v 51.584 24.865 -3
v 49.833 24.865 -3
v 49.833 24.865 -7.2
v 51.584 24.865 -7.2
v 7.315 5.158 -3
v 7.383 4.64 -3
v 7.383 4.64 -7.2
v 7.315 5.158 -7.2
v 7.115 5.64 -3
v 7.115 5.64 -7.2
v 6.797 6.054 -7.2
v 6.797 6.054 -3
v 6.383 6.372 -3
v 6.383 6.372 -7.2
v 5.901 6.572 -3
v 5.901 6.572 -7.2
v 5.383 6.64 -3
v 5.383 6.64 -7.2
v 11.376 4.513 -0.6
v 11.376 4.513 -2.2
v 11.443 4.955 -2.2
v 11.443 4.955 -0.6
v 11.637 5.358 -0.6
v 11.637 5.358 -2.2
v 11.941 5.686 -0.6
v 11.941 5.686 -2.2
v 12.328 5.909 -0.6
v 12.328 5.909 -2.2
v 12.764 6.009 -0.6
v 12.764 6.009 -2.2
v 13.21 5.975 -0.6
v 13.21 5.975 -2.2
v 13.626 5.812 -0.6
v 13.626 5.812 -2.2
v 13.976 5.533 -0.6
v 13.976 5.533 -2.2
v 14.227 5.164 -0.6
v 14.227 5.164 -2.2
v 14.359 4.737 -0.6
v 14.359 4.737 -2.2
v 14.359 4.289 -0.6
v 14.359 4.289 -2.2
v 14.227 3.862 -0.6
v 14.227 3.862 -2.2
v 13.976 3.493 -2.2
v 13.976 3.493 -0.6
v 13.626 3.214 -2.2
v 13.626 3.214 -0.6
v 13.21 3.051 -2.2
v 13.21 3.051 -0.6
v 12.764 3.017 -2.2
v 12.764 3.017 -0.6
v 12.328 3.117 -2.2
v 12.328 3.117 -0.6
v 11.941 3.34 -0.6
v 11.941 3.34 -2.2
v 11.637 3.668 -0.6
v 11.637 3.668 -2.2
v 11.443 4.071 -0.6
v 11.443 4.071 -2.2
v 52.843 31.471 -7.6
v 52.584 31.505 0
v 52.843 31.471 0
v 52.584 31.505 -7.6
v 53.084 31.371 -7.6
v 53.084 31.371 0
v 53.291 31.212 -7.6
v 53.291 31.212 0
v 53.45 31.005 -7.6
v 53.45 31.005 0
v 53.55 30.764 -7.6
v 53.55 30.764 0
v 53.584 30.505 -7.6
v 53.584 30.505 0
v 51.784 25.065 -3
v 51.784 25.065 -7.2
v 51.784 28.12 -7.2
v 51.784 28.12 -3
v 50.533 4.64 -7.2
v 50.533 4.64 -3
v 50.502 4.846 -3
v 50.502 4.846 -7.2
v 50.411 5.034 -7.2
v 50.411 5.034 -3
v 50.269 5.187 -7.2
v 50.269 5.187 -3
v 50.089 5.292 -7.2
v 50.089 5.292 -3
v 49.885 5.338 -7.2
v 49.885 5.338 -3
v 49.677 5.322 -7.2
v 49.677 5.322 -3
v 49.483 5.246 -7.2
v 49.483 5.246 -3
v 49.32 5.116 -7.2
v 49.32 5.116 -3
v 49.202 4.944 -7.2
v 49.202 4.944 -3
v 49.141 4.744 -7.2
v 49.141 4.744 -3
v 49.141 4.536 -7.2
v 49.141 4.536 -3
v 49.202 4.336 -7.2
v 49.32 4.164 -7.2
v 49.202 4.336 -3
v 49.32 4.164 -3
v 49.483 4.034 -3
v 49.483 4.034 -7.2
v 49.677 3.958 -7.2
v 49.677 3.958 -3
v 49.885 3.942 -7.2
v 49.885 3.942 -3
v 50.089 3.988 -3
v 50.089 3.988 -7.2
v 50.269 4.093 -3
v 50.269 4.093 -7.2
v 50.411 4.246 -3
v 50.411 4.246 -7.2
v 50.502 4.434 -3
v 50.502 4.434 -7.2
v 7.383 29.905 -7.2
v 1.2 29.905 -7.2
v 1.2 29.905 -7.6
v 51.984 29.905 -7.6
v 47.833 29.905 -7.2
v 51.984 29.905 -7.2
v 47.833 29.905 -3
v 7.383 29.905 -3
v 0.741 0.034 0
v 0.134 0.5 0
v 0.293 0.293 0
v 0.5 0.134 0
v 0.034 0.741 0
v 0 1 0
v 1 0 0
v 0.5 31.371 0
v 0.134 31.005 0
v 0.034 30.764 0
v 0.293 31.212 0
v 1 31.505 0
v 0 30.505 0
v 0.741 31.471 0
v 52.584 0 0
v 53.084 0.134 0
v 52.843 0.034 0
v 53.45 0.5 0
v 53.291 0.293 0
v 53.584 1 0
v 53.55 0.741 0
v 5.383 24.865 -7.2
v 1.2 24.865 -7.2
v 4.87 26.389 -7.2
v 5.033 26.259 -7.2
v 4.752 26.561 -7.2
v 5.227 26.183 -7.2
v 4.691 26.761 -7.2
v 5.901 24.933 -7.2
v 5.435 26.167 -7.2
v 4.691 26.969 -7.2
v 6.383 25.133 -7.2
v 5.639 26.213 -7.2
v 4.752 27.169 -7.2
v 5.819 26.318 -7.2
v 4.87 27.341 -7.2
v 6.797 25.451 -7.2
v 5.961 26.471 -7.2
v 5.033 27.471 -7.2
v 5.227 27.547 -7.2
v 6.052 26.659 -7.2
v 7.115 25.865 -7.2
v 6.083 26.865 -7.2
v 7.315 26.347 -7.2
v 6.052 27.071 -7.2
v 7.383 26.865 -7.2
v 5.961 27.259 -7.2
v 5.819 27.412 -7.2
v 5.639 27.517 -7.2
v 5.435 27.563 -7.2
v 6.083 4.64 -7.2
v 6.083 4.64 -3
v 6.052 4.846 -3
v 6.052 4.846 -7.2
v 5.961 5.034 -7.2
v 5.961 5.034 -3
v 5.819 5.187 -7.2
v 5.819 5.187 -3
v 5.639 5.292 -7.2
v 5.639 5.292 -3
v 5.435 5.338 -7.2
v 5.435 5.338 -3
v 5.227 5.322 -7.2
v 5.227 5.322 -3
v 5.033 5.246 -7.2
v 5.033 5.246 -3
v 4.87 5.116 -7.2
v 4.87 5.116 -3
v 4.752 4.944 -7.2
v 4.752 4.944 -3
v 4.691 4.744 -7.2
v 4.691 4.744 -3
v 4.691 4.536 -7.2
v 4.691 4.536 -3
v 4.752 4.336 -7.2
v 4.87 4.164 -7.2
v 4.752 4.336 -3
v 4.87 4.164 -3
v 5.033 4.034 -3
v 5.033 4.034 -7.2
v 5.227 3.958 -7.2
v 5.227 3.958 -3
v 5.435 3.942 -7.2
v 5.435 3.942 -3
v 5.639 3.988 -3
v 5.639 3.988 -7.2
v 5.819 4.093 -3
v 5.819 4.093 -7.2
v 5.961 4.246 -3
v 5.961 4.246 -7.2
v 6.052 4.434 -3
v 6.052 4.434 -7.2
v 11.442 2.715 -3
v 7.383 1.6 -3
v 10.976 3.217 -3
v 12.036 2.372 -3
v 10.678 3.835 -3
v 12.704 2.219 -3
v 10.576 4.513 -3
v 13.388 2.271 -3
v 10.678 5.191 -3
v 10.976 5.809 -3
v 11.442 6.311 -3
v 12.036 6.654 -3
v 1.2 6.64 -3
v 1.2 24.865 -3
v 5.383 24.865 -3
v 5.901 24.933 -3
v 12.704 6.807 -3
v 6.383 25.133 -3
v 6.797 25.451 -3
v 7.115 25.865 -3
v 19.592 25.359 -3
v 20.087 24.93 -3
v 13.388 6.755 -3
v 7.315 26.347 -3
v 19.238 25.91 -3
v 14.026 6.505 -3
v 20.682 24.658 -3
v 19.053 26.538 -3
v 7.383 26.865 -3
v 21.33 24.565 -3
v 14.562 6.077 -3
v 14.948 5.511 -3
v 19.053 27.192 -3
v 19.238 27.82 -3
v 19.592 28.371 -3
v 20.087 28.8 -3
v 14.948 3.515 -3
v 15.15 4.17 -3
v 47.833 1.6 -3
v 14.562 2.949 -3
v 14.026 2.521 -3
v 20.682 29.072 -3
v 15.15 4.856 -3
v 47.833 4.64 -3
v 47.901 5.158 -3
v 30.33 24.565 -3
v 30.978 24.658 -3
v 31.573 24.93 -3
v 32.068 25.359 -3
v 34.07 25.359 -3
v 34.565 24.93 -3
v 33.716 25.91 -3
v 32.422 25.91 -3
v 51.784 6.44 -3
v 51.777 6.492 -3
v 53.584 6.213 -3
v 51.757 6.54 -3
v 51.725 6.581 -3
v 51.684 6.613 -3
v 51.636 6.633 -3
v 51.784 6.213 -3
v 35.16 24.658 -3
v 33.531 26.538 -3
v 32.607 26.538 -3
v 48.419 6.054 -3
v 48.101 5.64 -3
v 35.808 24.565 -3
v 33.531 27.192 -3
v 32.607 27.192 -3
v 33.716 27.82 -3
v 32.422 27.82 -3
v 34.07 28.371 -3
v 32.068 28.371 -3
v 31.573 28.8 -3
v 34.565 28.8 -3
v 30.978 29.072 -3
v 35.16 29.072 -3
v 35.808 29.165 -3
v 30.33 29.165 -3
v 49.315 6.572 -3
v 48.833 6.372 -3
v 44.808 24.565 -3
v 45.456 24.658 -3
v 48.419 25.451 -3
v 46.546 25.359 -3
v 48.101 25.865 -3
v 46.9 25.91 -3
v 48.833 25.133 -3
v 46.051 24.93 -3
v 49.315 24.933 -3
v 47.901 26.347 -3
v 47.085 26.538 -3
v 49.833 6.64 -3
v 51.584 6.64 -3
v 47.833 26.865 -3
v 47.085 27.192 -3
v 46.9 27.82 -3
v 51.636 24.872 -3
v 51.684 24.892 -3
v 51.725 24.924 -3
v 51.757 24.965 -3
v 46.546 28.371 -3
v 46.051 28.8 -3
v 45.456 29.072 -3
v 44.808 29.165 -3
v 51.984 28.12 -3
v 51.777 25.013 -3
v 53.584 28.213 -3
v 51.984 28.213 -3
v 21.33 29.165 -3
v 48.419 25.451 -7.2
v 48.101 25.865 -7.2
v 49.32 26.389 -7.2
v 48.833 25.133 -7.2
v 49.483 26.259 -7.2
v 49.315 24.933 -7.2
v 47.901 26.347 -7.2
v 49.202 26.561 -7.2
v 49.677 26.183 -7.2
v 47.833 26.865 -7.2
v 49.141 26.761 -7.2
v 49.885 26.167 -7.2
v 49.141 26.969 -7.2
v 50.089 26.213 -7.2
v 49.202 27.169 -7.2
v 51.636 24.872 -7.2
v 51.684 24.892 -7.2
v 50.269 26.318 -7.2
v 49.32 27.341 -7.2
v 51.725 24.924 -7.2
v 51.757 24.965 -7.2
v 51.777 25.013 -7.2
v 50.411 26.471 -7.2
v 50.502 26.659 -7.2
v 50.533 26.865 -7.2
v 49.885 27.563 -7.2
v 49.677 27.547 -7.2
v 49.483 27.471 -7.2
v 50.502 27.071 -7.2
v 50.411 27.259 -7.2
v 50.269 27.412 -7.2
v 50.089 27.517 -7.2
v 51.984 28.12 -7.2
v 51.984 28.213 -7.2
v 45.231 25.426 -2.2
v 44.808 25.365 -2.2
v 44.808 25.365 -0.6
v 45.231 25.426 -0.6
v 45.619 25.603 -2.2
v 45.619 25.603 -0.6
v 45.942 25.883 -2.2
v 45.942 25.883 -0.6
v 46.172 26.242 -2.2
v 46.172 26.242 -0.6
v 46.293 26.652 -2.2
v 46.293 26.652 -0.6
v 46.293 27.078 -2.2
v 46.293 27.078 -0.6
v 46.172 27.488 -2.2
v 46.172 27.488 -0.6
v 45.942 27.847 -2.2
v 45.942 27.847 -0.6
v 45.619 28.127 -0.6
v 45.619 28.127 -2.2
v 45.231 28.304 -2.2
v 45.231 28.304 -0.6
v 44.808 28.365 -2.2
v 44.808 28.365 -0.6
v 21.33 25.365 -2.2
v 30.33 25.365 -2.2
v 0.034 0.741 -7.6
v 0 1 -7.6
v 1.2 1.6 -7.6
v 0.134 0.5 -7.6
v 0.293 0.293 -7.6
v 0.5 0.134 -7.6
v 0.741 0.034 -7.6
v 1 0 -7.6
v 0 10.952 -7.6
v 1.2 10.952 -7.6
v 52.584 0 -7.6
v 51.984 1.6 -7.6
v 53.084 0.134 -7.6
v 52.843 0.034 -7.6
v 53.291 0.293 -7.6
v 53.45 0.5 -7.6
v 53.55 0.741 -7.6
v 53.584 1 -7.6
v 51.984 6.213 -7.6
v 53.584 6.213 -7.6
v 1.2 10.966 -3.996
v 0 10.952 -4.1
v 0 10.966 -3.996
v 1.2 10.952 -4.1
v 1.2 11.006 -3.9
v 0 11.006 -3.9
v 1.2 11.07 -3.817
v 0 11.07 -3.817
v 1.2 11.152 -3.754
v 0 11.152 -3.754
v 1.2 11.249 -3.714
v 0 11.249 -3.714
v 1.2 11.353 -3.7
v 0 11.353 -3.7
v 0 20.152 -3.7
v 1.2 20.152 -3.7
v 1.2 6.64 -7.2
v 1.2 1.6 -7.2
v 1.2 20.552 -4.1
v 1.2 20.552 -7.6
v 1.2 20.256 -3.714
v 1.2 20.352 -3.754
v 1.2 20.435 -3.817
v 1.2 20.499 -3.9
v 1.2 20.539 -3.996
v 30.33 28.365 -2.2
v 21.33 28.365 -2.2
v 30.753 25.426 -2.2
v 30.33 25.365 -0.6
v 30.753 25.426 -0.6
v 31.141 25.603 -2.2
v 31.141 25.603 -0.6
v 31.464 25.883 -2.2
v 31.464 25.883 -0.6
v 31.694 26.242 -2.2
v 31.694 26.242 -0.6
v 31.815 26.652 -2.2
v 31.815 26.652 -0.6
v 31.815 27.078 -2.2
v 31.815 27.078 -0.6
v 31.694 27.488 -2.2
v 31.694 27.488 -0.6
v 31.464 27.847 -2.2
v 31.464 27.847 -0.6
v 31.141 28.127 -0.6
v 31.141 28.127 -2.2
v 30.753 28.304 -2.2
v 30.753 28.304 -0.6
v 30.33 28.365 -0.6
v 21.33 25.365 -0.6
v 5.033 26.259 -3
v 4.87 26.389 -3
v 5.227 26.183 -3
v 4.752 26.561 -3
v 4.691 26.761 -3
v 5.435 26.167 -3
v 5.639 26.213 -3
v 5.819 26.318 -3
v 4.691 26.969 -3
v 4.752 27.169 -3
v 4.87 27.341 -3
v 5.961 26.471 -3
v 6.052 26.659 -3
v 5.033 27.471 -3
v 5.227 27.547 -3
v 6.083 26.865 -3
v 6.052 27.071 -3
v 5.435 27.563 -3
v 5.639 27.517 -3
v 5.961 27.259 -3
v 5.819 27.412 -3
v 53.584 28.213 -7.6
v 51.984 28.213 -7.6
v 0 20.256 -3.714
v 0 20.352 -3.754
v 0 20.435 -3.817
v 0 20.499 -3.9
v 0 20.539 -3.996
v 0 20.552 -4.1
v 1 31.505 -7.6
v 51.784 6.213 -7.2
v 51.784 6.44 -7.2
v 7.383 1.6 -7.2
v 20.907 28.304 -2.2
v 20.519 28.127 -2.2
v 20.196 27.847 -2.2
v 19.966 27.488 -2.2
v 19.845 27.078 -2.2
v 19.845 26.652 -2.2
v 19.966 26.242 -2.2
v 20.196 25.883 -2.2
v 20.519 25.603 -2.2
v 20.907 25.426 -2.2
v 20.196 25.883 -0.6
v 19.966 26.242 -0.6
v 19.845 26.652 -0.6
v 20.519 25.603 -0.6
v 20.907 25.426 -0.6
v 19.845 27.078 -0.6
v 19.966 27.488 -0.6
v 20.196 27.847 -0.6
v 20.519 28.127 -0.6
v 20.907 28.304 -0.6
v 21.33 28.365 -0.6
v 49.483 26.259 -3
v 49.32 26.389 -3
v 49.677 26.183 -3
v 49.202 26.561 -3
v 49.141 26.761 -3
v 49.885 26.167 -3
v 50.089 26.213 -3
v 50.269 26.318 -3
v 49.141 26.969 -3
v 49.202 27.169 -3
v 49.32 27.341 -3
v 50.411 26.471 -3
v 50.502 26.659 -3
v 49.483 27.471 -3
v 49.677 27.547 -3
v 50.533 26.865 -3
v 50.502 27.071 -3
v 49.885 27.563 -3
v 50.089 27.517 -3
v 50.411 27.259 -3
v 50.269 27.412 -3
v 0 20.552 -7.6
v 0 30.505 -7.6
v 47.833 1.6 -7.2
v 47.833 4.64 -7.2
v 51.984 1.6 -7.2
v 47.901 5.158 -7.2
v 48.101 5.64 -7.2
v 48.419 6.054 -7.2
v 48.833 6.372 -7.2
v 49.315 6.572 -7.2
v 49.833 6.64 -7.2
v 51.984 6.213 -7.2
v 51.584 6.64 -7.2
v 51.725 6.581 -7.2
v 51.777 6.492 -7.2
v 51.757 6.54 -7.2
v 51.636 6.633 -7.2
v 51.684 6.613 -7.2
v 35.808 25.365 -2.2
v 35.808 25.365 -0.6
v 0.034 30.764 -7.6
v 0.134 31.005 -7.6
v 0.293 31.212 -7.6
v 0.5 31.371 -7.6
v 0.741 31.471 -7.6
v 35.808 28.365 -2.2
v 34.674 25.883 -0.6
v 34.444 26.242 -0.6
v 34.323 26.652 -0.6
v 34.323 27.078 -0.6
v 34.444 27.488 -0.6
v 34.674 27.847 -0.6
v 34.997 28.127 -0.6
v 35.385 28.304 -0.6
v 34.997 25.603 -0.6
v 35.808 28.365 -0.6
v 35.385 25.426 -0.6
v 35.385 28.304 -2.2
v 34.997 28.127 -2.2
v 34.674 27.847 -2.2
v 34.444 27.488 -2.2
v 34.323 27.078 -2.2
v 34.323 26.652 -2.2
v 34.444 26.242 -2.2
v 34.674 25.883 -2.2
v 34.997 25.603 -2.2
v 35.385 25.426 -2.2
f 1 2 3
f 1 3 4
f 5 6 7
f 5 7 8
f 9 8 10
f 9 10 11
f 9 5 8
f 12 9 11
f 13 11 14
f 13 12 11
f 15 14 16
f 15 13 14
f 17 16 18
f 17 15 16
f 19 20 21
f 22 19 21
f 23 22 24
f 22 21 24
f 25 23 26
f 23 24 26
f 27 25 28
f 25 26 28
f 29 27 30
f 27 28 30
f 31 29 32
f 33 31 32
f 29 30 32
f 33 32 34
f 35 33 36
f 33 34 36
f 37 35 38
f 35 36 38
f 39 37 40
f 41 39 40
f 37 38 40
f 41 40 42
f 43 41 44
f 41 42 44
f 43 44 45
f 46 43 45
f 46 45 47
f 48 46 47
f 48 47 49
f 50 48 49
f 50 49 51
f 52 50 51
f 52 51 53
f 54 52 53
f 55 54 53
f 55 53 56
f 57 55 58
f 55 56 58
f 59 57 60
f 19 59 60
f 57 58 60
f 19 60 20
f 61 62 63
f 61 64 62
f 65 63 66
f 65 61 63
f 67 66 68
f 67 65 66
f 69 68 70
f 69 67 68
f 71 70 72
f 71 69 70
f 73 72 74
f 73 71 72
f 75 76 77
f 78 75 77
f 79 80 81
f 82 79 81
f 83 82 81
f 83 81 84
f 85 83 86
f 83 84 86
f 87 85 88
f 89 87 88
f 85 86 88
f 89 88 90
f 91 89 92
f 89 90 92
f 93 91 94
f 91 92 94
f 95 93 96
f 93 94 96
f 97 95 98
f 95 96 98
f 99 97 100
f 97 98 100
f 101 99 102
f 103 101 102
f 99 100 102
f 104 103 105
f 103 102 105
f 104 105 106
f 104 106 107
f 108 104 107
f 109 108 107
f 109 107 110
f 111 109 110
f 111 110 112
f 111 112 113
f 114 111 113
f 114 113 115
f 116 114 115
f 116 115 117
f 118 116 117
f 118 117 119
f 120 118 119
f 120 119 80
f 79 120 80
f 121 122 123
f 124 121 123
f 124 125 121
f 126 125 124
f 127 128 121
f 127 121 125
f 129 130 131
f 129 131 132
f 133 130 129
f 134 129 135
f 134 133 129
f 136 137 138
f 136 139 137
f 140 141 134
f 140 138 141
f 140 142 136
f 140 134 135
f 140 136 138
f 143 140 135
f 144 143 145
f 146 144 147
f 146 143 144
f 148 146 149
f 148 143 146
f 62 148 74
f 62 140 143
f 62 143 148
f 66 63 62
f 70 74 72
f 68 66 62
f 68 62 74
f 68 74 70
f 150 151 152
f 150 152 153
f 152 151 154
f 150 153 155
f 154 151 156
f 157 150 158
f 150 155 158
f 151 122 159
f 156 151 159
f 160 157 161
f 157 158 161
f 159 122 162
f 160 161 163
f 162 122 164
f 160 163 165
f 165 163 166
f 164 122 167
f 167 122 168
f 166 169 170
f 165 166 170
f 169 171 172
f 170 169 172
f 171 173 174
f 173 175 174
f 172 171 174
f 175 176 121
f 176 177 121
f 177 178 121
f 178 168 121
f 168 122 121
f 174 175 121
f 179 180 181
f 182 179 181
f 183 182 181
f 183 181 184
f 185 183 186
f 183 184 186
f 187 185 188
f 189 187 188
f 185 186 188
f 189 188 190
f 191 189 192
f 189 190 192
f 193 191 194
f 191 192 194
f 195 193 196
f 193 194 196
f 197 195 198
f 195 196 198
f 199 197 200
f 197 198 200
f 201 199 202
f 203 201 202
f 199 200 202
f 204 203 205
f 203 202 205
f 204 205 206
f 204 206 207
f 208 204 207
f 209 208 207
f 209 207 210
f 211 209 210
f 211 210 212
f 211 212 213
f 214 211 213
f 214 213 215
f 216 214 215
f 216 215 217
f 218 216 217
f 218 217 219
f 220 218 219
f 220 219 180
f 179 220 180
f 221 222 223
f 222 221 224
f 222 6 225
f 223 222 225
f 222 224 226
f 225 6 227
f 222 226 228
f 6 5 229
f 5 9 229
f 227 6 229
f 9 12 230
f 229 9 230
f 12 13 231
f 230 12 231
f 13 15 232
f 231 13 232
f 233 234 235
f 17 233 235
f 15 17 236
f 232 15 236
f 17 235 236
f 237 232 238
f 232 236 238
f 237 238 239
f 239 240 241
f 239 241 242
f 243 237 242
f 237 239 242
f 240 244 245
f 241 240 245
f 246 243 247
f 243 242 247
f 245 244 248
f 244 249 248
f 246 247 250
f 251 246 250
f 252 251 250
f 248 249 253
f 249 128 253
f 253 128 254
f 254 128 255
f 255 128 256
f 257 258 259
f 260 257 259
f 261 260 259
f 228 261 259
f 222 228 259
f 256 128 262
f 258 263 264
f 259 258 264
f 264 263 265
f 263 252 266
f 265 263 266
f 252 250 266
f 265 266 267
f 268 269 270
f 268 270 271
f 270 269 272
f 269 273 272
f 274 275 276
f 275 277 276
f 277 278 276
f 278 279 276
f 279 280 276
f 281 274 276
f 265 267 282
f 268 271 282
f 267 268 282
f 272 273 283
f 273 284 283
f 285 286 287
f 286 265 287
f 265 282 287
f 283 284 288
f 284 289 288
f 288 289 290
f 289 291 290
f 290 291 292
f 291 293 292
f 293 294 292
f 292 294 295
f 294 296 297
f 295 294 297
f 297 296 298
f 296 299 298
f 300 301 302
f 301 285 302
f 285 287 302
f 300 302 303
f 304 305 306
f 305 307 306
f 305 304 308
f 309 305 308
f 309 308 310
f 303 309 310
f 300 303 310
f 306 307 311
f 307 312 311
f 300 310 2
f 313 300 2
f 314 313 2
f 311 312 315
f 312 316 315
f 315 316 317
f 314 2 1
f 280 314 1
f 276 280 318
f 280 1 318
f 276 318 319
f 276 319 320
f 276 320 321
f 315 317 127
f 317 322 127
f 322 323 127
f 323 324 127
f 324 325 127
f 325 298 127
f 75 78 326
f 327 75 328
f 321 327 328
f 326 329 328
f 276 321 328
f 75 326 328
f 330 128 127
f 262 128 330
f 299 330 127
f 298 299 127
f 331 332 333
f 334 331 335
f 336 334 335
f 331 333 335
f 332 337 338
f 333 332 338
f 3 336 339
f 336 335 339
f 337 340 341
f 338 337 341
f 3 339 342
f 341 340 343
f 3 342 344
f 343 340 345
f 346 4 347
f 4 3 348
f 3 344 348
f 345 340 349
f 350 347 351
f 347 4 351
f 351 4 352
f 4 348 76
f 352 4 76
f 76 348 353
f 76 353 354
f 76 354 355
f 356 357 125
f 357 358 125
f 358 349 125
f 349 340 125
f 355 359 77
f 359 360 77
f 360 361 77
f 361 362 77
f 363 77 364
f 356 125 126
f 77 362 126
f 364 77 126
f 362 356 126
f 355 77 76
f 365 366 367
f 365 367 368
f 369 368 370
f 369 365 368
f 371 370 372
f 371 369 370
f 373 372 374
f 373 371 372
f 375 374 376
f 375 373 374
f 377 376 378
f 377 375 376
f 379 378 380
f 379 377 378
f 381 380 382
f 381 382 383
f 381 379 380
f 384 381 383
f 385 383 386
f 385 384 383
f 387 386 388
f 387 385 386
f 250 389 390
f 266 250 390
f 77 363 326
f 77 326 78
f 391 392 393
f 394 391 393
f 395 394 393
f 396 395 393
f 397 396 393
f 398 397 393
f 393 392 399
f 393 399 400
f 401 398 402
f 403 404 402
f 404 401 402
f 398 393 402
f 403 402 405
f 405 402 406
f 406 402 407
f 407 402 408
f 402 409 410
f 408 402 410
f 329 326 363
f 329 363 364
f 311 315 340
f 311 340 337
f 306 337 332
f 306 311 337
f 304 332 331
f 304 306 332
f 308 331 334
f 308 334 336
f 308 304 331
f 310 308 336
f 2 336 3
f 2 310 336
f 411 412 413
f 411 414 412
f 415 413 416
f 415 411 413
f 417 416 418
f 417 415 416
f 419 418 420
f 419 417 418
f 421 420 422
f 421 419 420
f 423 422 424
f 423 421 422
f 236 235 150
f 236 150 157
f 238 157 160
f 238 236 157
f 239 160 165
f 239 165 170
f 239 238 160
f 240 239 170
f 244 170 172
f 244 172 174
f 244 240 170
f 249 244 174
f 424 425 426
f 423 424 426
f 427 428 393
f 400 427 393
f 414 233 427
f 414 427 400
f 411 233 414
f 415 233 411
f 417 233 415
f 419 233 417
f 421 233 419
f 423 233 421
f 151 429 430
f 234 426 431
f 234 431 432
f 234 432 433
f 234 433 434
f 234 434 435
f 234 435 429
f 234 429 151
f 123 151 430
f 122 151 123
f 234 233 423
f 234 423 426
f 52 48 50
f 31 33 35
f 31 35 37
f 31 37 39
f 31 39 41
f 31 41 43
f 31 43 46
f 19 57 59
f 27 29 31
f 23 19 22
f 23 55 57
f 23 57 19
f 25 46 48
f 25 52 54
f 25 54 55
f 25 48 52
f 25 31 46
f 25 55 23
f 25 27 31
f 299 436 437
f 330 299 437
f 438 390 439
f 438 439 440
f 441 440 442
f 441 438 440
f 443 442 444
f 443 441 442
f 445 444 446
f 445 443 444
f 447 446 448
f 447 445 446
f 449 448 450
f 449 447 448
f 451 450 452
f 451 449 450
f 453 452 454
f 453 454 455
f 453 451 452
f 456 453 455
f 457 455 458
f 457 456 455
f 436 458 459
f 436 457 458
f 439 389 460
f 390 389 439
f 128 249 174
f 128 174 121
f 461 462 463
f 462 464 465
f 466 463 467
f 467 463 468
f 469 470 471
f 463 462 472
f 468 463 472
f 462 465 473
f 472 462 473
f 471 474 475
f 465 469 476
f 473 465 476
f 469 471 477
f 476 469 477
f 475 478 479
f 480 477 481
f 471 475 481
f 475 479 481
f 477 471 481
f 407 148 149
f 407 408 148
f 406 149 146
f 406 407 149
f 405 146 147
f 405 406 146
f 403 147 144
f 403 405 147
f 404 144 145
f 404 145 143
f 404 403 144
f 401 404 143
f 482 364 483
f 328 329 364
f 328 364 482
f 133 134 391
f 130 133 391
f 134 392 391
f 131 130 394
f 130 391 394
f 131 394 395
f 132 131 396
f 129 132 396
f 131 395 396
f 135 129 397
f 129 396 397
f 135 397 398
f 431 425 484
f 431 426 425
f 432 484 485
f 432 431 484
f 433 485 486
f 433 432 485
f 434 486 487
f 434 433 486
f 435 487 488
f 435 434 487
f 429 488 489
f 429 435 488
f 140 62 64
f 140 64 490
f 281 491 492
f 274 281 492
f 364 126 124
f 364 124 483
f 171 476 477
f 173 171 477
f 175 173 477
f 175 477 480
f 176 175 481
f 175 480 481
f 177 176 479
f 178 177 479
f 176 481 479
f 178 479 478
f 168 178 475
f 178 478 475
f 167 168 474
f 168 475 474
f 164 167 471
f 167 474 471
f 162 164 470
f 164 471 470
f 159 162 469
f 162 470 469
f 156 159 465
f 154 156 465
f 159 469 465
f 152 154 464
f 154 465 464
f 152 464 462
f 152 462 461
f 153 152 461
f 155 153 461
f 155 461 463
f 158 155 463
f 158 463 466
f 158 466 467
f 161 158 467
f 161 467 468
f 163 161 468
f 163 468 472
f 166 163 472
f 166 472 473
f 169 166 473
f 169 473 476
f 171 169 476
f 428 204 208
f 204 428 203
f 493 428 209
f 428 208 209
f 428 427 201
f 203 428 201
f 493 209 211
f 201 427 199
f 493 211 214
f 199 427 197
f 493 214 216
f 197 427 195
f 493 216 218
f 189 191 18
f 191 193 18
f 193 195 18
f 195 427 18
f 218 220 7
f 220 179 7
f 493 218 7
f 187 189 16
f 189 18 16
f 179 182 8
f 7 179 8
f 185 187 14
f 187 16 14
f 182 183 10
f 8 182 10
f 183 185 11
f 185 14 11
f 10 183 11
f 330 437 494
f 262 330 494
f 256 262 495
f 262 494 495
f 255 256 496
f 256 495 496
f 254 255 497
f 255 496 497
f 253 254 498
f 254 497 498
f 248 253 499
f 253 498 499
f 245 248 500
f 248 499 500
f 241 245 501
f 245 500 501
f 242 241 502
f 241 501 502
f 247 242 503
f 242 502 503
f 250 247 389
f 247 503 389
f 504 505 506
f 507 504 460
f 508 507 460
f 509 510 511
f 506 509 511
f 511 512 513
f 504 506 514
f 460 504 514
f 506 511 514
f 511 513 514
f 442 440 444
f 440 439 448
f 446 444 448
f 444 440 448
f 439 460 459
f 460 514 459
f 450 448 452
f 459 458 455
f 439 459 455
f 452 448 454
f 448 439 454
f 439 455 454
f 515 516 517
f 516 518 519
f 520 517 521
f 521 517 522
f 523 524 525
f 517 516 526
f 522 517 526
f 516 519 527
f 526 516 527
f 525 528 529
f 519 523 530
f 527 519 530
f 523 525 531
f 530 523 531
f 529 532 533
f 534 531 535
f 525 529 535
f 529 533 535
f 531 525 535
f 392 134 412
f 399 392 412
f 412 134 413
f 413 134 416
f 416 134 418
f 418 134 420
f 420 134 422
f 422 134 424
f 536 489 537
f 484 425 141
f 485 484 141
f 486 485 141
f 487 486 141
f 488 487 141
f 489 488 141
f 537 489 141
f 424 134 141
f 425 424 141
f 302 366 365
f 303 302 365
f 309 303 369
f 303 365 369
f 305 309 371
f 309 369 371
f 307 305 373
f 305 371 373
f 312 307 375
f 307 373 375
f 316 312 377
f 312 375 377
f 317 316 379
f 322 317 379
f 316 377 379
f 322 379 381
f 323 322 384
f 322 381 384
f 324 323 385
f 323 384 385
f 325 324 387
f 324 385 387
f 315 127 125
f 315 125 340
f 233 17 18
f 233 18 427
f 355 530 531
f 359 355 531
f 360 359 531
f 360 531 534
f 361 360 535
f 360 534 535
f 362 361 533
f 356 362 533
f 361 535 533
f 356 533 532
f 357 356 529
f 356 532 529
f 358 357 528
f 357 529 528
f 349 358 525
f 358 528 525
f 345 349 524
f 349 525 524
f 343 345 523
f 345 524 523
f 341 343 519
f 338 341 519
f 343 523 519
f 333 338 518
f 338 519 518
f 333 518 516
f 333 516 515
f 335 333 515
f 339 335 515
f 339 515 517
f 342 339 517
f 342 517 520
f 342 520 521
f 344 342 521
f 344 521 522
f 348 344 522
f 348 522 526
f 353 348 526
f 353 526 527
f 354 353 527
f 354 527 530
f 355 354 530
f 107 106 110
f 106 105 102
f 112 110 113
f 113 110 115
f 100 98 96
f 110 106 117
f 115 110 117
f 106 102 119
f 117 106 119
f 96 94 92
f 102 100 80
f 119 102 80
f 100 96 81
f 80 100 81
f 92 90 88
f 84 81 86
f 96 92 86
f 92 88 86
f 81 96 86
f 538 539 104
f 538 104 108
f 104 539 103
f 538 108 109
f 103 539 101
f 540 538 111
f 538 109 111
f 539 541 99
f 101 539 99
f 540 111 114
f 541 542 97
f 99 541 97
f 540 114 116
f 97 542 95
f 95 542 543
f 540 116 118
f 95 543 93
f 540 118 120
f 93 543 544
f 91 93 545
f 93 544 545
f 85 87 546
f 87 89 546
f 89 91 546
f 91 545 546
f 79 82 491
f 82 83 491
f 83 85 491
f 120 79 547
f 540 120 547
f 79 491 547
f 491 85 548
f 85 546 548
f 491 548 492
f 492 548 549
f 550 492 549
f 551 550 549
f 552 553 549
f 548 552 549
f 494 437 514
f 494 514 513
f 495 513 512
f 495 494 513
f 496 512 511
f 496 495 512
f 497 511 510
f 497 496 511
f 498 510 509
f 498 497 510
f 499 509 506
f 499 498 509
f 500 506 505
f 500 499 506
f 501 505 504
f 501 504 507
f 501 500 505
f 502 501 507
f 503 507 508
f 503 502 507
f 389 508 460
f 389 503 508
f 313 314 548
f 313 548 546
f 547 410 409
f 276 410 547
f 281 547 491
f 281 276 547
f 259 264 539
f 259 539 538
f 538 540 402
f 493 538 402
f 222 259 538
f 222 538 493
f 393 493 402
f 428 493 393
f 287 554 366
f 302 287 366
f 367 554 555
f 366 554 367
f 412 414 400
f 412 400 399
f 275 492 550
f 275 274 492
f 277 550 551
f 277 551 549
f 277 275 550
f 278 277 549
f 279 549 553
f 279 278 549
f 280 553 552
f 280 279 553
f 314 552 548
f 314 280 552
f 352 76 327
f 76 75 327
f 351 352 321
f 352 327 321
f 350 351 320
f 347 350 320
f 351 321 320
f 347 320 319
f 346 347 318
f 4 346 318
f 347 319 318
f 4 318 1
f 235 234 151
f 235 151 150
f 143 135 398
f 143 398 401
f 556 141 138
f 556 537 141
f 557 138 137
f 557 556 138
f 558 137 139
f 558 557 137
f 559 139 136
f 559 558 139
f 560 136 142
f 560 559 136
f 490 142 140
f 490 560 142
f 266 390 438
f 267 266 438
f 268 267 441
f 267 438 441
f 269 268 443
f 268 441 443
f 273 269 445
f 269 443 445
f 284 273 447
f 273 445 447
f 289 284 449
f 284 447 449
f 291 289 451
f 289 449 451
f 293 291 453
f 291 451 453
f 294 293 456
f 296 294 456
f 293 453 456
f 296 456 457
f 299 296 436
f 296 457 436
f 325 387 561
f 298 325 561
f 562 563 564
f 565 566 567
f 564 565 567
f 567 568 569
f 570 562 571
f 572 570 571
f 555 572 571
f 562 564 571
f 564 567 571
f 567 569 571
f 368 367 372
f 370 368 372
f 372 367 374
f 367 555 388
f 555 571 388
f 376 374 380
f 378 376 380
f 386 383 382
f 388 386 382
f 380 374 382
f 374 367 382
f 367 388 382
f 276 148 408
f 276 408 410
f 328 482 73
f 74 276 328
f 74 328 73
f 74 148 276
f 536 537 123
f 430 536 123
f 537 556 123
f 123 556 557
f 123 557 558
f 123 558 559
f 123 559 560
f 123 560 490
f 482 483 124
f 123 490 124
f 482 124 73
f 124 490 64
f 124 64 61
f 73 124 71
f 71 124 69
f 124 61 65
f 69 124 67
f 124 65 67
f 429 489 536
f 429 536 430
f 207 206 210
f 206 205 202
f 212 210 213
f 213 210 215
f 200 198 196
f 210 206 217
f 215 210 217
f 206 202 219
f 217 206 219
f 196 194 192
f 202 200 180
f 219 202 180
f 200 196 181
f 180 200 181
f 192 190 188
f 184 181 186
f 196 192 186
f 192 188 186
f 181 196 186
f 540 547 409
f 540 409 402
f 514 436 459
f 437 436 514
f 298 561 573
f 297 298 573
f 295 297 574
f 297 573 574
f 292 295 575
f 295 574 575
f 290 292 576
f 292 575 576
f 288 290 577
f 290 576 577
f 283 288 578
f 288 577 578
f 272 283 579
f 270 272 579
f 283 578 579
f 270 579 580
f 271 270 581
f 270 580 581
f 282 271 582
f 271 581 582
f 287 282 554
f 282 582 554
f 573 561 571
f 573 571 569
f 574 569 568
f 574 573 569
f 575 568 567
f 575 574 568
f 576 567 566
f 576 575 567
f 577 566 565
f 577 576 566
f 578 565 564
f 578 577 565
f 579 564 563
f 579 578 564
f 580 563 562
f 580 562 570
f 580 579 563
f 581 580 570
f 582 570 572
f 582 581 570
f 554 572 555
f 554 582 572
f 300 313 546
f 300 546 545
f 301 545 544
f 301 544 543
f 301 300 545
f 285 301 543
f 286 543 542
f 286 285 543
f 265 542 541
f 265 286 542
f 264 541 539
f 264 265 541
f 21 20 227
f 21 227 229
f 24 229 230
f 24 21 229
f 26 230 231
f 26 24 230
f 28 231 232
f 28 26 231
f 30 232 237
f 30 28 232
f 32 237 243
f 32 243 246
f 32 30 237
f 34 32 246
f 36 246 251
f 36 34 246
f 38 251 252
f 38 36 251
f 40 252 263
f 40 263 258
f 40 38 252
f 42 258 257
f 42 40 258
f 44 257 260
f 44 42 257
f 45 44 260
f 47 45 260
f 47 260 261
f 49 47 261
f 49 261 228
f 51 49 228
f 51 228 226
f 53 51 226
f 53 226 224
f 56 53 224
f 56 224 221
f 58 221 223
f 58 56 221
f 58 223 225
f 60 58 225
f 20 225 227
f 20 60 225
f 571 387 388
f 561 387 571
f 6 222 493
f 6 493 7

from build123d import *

# Parameters (mm, degrees)
SKETCH_1_R          = 2
SKETCH_1_R_2        = 0.7
EXTRUDE_5_DEPTH     = 3
EXTRUDE_6_DEPTH     = 7.6
SKETCH_1_8_R        = 2
SKETCH_1_8_R_2      = 0.7
EXTRUDE_7_DEPTH     = 7.2
SKETCH_1_9_W        = 1.2
SKETCH_1_9_H        = 9.6
EXTRUDE_8_DEPTH     = 3.7
FILLET_1_R          = 1
SKETCH_2_R          = 1.5
CUT_EXTRUDE_1_DEPTH = 2.4
CHAMFER_1_SIZE      = 0.8
FILLET_2_R          = 0.4
SKETCH_3_W          = 0.2
SKETCH_3_H          = 3.255284899
SKETCH_3_H_2        = 0.427
CUT_EXTRUDE_2_DEPTH = 4.2
FILLET_3_R          = 0.2


with BuildPart() as part:
    # Эскиз1 → Бобышка-Вытянуть5 (new body)
    with BuildSketch(Plane.XY):
        with BuildLine():
            Line((1.2, 20.5525), (1.2, 10.9525))
            Line((1.2, 10.9525), (1.2, 6.64))
            Line((1.2, 6.64), (5.383, 6.64))
            ThreePointArc((5.383, 6.64), (6.797213562, 6.054213562), (7.383, 4.64))
            Line((7.383, 4.64), (7.383, 1.6))
            Line((7.383, 1.6), (47.833, 1.6))
            Line((47.833, 1.6), (47.833, 4.64))
            ThreePointArc((47.833, 4.64), (48.418786438, 6.054213562), (49.833, 6.64))
            Line((49.833, 6.64), (51.984, 6.64))
            Line((51.984, 6.64), (51.984, 24.865))
            Line((51.984, 24.865), (49.833, 24.865))
            ThreePointArc((49.833, 24.865), (48.418786438, 25.450786438), (47.833, 26.865))
            Line((47.833, 26.865), (47.833, 29.905))
            Line((47.833, 29.905), (7.383, 29.905))
            Line((7.383, 29.905), (7.383, 26.865))
            ThreePointArc((7.383, 26.865), (6.797213562, 25.450786438), (5.383, 24.865))
            Line((5.383, 24.865), (1.2, 24.865))
            Line((1.2, 24.865), (1.2, 20.5525))
        make_face()
        Polygon((51.984, 6.213), (53.584, 6.213), (53.584, 28.213), (51.984, 28.213), (51.984, 24.865), (51.984, 6.64), align=None)
        with BuildLine():
            Line((51.984, 24.865), (51.984, 28.213))
            Line((51.984, 28.213), (51.984, 29.905))
            Line((51.984, 29.905), (47.833, 29.905))
            Line((47.833, 29.905), (47.833, 26.865))
            ThreePointArc((47.833, 26.865), (49.833, 28.865), (51.833, 26.865))
            ThreePointArc((51.833, 26.865), (51.247213562, 25.450786438), (49.833, 24.865))
            Line((49.833, 24.865), (51.984, 24.865))
        make_face()
        with Locations((49.833, 26.865)):
            Circle(SKETCH_1_R)
        with Locations((49.833, 26.865)):
            Circle(SKETCH_1_R_2, mode=Mode.SUBTRACT)
        with Locations((49.833, 26.865)):
            Circle(SKETCH_1_R_2)
        with BuildLine():
            Line((1.2, 29.905), (1.2, 24.865))
            Line((1.2, 24.865), (5.383, 24.865))
            ThreePointArc((5.383, 24.865), (3.968786438, 28.279213562), (7.383, 26.865))
            Line((7.383, 26.865), (7.383, 29.905))
            Line((7.383, 29.905), (1.2, 29.905))
        make_face()
        with Locations((5.383, 26.865)):
            Circle(SKETCH_1_R)
        with Locations((5.383, 26.865)):
            Circle(SKETCH_1_R_2, mode=Mode.SUBTRACT)
        with Locations((5.383, 26.865)):
            Circle(SKETCH_1_R_2)
        with BuildLine():
            Line((5.383, 6.64), (1.2, 6.64))
            Line((1.2, 6.64), (1.2, 1.6))
            Line((1.2, 1.6), (7.383, 1.6))
            Line((7.383, 1.6), (7.383, 4.64))
            ThreePointArc((7.383, 4.64), (3.968786438, 3.225786438), (5.383, 6.64))
        make_face()
        with Locations((5.383, 4.64)):
            Circle(SKETCH_1_R)
        with Locations((5.383, 4.64)):
            Circle(SKETCH_1_R_2, mode=Mode.SUBTRACT)
        with Locations((5.383, 4.64)):
            Circle(SKETCH_1_R_2)
        with BuildLine():
            Line((51.984, 1.6), (51.984, 6.213))
            Line((51.984, 6.213), (51.984, 6.64))
            Line((51.984, 6.64), (49.833, 6.64))
            ThreePointArc((49.833, 6.64), (51.247213562, 6.054213562), (51.833, 4.64))
            ThreePointArc((51.833, 4.64), (49.833, 2.64), (47.833, 4.64))
            Line((47.833, 4.64), (47.833, 1.6))
            Line((47.833, 1.6), (51.984, 1.6))
        make_face()
        with Locations((49.833, 4.64)):
            Circle(SKETCH_1_R)
        with Locations((49.833, 4.64)):
            Circle(SKETCH_1_R_2, mode=Mode.SUBTRACT)
        with Locations((49.833, 4.64)):
            Circle(SKETCH_1_R_2)
    extrude(amount=-EXTRUDE_5_DEPTH)

    # Эскиз1<7> → Бобышка-Вытянуть6 (add)
    with BuildSketch(Plane.XY):
        Polygon((0, 31.505), (0, 20.5525), (1.2, 20.5525), (1.2, 24.865), (1.2, 29.905), (7.383, 29.905), (47.833, 29.905), (51.984, 29.905), (51.984, 28.213), (53.584, 28.213), (53.584, 31.505), align=None)
        Polygon((0, 10.9525), (0, 0), (53.584, 0), (53.584, 6.213), (51.984, 6.213), (51.984, 1.6), (47.833, 1.6), (7.383, 1.6), (1.2, 1.6), (1.2, 6.64), (1.2, 10.9525), align=None)
    extrude(amount=-EXTRUDE_6_DEPTH)

    # Эскиз1<8> → Бобышка-Вытянуть7 (add)
    with BuildSketch(Plane.XY):
        with BuildLine():
            Line((51.984, 24.865), (51.984, 28.213))
            Line((51.984, 28.213), (51.984, 29.905))
            Line((51.984, 29.905), (47.833, 29.905))
            Line((47.833, 29.905), (47.833, 26.865))
            ThreePointArc((47.833, 26.865), (49.833, 28.865), (51.833, 26.865))
            ThreePointArc((51.833, 26.865), (51.247213562, 25.450786438), (49.833, 24.865))
            Line((49.833, 24.865), (51.984, 24.865))
        make_face()
        with Locations((49.833, 26.865)):
            Circle(SKETCH_1_8_R)
        with Locations((49.833, 26.865)):
            Circle(SKETCH_1_8_R_2, mode=Mode.SUBTRACT)
        with BuildLine():
            Line((1.2, 29.905), (1.2, 24.865))
            Line((1.2, 24.865), (5.383, 24.865))
            ThreePointArc((5.383, 24.865), (3.968786438, 28.279213562), (7.383, 26.865))
            Line((7.383, 26.865), (7.383, 29.905))
            Line((7.383, 29.905), (1.2, 29.905))
        make_face()
        with Locations((5.383, 26.865)):
            Circle(SKETCH_1_8_R)
        with Locations((5.383, 26.865)):
            Circle(SKETCH_1_8_R_2, mode=Mode.SUBTRACT)
        with BuildLine():
            Line((51.984, 1.6), (51.984, 6.213))
            Line((51.984, 6.213), (51.984, 6.64))
            Line((51.984, 6.64), (49.833, 6.64))
            ThreePointArc((49.833, 6.64), (51.247213562, 6.054213562), (51.833, 4.64))
            ThreePointArc((51.833, 4.64), (49.833, 2.64), (47.833, 4.64))
            Line((47.833, 4.64), (47.833, 1.6))
            Line((47.833, 1.6), (51.984, 1.6))
        make_face()
        with Locations((49.833, 4.64)):
            Circle(SKETCH_1_8_R)
        with Locations((49.833, 4.64)):
            Circle(SKETCH_1_8_R_2, mode=Mode.SUBTRACT)
        with BuildLine():
            Line((5.383, 6.64), (1.2, 6.64))
            Line((1.2, 6.64), (1.2, 1.6))
            Line((1.2, 1.6), (7.383, 1.6))
            Line((7.383, 1.6), (7.383, 4.64))
            ThreePointArc((7.383, 4.64), (3.968786438, 3.225786438), (5.383, 6.64))
        make_face()
        with Locations((5.383, 4.64)):
            Circle(SKETCH_1_8_R)
        with Locations((5.383, 4.64)):
            Circle(SKETCH_1_8_R_2, mode=Mode.SUBTRACT)
    extrude(amount=-EXTRUDE_7_DEPTH)

    # Эскиз1<9> → Бобышка-Вытянуть8 (add)
    with BuildSketch(Plane.XY):
        with Locations((0.6, 15.7525)):
            Rectangle(SKETCH_1_9_W, SKETCH_1_9_H)
    extrude(amount=-EXTRUDE_8_DEPTH)

    # Скругление1
    fillet_1_edges = [part.edges().sort_by_distance(p)[0] for p in [
        (0, 31.505, -3.8),
        (53.584, 31.505, -3.8),
        (53.584, 0, -3.8),
        (0, 0, -3.8),
    ]]
    fillet(fillet_1_edges, radius=FILLET_1_R)

    # Эскиз2 → Вырез-Вытянуть1 (cut)
    with BuildSketch(Plane(origin=(0, 0, -3), x_dir=(-1, 0, 0), z_dir=(0, 0, -1))):
        with Locations((-12.876, 4.513)):
            Circle(SKETCH_2_R)
        with BuildLine():
            Line((-44.808, 28.365), (-35.808, 28.365))
            ThreePointArc((-35.808, 28.365), (-34.308, 26.865), (-35.808, 25.365))
            Line((-35.808, 25.365), (-44.808, 25.365))
            ThreePointArc((-44.808, 25.365), (-46.308, 26.865), (-44.808, 28.365))
        make_face()
        with BuildLine():
            Line((-30.33, 28.365), (-21.33, 28.365))
            ThreePointArc((-21.33, 28.365), (-19.83, 26.865), (-21.33, 25.365))
            Line((-21.33, 25.365), (-30.33, 25.365))
            ThreePointArc((-30.33, 25.365), (-31.83, 26.865), (-30.33, 28.365))
        make_face()
    extrude(amount=-CUT_EXTRUDE_1_DEPTH, mode=Mode.SUBTRACT)

    # Фаска1
    chamfer_1_edges = [part.edges().sort_by_distance(p)[0] for p in [
        (46.308, 26.865, -3),
        (40.308, 25.365, -3),
        (34.308, 26.865, -3),
        (40.308, 28.365, -3),
        (31.83, 26.865, -3),
        (25.83, 25.365, -3),
        (19.83, 26.865, -3),
        (25.83, 28.365, -3),
        (14.376, 4.513, -3),
    ]]
    chamfer(chamfer_1_edges, length=CHAMFER_1_SIZE)

    # Скругление2
    fillet_2_edges = [part.edges().sort_by_distance(p)[0] for p in [
        (0.6, 20.5525, -3.7),
        (0.6, 10.9525, -3.7),
    ]]
    fillet(fillet_2_edges, radius=FILLET_2_R)

    # Эскиз3 → Вырез-Вытянуть2 (cut)
    with BuildSketch(Plane(origin=(0, 0, -7.2), x_dir=(-1, 0, 0), z_dir=(0, 0, -1))):
        with Locations((-51.884, 26.49264245)):
            Rectangle(SKETCH_3_W, SKETCH_3_H)
        with Locations((-51.884, 6.4265)):
            Rectangle(SKETCH_3_W, SKETCH_3_H_2)
    extrude(amount=-CUT_EXTRUDE_2_DEPTH, mode=Mode.SUBTRACT)

    # Скругление3
    fillet_3_edges = [part.edges().sort_by_distance(p)[0] for p in [
        (51.784, 24.865, -5.1),
        (51.784, 6.64, -5.1),
    ]]
    fillet(fillet_3_edges, radius=FILLET_3_R)


solid = part.part
